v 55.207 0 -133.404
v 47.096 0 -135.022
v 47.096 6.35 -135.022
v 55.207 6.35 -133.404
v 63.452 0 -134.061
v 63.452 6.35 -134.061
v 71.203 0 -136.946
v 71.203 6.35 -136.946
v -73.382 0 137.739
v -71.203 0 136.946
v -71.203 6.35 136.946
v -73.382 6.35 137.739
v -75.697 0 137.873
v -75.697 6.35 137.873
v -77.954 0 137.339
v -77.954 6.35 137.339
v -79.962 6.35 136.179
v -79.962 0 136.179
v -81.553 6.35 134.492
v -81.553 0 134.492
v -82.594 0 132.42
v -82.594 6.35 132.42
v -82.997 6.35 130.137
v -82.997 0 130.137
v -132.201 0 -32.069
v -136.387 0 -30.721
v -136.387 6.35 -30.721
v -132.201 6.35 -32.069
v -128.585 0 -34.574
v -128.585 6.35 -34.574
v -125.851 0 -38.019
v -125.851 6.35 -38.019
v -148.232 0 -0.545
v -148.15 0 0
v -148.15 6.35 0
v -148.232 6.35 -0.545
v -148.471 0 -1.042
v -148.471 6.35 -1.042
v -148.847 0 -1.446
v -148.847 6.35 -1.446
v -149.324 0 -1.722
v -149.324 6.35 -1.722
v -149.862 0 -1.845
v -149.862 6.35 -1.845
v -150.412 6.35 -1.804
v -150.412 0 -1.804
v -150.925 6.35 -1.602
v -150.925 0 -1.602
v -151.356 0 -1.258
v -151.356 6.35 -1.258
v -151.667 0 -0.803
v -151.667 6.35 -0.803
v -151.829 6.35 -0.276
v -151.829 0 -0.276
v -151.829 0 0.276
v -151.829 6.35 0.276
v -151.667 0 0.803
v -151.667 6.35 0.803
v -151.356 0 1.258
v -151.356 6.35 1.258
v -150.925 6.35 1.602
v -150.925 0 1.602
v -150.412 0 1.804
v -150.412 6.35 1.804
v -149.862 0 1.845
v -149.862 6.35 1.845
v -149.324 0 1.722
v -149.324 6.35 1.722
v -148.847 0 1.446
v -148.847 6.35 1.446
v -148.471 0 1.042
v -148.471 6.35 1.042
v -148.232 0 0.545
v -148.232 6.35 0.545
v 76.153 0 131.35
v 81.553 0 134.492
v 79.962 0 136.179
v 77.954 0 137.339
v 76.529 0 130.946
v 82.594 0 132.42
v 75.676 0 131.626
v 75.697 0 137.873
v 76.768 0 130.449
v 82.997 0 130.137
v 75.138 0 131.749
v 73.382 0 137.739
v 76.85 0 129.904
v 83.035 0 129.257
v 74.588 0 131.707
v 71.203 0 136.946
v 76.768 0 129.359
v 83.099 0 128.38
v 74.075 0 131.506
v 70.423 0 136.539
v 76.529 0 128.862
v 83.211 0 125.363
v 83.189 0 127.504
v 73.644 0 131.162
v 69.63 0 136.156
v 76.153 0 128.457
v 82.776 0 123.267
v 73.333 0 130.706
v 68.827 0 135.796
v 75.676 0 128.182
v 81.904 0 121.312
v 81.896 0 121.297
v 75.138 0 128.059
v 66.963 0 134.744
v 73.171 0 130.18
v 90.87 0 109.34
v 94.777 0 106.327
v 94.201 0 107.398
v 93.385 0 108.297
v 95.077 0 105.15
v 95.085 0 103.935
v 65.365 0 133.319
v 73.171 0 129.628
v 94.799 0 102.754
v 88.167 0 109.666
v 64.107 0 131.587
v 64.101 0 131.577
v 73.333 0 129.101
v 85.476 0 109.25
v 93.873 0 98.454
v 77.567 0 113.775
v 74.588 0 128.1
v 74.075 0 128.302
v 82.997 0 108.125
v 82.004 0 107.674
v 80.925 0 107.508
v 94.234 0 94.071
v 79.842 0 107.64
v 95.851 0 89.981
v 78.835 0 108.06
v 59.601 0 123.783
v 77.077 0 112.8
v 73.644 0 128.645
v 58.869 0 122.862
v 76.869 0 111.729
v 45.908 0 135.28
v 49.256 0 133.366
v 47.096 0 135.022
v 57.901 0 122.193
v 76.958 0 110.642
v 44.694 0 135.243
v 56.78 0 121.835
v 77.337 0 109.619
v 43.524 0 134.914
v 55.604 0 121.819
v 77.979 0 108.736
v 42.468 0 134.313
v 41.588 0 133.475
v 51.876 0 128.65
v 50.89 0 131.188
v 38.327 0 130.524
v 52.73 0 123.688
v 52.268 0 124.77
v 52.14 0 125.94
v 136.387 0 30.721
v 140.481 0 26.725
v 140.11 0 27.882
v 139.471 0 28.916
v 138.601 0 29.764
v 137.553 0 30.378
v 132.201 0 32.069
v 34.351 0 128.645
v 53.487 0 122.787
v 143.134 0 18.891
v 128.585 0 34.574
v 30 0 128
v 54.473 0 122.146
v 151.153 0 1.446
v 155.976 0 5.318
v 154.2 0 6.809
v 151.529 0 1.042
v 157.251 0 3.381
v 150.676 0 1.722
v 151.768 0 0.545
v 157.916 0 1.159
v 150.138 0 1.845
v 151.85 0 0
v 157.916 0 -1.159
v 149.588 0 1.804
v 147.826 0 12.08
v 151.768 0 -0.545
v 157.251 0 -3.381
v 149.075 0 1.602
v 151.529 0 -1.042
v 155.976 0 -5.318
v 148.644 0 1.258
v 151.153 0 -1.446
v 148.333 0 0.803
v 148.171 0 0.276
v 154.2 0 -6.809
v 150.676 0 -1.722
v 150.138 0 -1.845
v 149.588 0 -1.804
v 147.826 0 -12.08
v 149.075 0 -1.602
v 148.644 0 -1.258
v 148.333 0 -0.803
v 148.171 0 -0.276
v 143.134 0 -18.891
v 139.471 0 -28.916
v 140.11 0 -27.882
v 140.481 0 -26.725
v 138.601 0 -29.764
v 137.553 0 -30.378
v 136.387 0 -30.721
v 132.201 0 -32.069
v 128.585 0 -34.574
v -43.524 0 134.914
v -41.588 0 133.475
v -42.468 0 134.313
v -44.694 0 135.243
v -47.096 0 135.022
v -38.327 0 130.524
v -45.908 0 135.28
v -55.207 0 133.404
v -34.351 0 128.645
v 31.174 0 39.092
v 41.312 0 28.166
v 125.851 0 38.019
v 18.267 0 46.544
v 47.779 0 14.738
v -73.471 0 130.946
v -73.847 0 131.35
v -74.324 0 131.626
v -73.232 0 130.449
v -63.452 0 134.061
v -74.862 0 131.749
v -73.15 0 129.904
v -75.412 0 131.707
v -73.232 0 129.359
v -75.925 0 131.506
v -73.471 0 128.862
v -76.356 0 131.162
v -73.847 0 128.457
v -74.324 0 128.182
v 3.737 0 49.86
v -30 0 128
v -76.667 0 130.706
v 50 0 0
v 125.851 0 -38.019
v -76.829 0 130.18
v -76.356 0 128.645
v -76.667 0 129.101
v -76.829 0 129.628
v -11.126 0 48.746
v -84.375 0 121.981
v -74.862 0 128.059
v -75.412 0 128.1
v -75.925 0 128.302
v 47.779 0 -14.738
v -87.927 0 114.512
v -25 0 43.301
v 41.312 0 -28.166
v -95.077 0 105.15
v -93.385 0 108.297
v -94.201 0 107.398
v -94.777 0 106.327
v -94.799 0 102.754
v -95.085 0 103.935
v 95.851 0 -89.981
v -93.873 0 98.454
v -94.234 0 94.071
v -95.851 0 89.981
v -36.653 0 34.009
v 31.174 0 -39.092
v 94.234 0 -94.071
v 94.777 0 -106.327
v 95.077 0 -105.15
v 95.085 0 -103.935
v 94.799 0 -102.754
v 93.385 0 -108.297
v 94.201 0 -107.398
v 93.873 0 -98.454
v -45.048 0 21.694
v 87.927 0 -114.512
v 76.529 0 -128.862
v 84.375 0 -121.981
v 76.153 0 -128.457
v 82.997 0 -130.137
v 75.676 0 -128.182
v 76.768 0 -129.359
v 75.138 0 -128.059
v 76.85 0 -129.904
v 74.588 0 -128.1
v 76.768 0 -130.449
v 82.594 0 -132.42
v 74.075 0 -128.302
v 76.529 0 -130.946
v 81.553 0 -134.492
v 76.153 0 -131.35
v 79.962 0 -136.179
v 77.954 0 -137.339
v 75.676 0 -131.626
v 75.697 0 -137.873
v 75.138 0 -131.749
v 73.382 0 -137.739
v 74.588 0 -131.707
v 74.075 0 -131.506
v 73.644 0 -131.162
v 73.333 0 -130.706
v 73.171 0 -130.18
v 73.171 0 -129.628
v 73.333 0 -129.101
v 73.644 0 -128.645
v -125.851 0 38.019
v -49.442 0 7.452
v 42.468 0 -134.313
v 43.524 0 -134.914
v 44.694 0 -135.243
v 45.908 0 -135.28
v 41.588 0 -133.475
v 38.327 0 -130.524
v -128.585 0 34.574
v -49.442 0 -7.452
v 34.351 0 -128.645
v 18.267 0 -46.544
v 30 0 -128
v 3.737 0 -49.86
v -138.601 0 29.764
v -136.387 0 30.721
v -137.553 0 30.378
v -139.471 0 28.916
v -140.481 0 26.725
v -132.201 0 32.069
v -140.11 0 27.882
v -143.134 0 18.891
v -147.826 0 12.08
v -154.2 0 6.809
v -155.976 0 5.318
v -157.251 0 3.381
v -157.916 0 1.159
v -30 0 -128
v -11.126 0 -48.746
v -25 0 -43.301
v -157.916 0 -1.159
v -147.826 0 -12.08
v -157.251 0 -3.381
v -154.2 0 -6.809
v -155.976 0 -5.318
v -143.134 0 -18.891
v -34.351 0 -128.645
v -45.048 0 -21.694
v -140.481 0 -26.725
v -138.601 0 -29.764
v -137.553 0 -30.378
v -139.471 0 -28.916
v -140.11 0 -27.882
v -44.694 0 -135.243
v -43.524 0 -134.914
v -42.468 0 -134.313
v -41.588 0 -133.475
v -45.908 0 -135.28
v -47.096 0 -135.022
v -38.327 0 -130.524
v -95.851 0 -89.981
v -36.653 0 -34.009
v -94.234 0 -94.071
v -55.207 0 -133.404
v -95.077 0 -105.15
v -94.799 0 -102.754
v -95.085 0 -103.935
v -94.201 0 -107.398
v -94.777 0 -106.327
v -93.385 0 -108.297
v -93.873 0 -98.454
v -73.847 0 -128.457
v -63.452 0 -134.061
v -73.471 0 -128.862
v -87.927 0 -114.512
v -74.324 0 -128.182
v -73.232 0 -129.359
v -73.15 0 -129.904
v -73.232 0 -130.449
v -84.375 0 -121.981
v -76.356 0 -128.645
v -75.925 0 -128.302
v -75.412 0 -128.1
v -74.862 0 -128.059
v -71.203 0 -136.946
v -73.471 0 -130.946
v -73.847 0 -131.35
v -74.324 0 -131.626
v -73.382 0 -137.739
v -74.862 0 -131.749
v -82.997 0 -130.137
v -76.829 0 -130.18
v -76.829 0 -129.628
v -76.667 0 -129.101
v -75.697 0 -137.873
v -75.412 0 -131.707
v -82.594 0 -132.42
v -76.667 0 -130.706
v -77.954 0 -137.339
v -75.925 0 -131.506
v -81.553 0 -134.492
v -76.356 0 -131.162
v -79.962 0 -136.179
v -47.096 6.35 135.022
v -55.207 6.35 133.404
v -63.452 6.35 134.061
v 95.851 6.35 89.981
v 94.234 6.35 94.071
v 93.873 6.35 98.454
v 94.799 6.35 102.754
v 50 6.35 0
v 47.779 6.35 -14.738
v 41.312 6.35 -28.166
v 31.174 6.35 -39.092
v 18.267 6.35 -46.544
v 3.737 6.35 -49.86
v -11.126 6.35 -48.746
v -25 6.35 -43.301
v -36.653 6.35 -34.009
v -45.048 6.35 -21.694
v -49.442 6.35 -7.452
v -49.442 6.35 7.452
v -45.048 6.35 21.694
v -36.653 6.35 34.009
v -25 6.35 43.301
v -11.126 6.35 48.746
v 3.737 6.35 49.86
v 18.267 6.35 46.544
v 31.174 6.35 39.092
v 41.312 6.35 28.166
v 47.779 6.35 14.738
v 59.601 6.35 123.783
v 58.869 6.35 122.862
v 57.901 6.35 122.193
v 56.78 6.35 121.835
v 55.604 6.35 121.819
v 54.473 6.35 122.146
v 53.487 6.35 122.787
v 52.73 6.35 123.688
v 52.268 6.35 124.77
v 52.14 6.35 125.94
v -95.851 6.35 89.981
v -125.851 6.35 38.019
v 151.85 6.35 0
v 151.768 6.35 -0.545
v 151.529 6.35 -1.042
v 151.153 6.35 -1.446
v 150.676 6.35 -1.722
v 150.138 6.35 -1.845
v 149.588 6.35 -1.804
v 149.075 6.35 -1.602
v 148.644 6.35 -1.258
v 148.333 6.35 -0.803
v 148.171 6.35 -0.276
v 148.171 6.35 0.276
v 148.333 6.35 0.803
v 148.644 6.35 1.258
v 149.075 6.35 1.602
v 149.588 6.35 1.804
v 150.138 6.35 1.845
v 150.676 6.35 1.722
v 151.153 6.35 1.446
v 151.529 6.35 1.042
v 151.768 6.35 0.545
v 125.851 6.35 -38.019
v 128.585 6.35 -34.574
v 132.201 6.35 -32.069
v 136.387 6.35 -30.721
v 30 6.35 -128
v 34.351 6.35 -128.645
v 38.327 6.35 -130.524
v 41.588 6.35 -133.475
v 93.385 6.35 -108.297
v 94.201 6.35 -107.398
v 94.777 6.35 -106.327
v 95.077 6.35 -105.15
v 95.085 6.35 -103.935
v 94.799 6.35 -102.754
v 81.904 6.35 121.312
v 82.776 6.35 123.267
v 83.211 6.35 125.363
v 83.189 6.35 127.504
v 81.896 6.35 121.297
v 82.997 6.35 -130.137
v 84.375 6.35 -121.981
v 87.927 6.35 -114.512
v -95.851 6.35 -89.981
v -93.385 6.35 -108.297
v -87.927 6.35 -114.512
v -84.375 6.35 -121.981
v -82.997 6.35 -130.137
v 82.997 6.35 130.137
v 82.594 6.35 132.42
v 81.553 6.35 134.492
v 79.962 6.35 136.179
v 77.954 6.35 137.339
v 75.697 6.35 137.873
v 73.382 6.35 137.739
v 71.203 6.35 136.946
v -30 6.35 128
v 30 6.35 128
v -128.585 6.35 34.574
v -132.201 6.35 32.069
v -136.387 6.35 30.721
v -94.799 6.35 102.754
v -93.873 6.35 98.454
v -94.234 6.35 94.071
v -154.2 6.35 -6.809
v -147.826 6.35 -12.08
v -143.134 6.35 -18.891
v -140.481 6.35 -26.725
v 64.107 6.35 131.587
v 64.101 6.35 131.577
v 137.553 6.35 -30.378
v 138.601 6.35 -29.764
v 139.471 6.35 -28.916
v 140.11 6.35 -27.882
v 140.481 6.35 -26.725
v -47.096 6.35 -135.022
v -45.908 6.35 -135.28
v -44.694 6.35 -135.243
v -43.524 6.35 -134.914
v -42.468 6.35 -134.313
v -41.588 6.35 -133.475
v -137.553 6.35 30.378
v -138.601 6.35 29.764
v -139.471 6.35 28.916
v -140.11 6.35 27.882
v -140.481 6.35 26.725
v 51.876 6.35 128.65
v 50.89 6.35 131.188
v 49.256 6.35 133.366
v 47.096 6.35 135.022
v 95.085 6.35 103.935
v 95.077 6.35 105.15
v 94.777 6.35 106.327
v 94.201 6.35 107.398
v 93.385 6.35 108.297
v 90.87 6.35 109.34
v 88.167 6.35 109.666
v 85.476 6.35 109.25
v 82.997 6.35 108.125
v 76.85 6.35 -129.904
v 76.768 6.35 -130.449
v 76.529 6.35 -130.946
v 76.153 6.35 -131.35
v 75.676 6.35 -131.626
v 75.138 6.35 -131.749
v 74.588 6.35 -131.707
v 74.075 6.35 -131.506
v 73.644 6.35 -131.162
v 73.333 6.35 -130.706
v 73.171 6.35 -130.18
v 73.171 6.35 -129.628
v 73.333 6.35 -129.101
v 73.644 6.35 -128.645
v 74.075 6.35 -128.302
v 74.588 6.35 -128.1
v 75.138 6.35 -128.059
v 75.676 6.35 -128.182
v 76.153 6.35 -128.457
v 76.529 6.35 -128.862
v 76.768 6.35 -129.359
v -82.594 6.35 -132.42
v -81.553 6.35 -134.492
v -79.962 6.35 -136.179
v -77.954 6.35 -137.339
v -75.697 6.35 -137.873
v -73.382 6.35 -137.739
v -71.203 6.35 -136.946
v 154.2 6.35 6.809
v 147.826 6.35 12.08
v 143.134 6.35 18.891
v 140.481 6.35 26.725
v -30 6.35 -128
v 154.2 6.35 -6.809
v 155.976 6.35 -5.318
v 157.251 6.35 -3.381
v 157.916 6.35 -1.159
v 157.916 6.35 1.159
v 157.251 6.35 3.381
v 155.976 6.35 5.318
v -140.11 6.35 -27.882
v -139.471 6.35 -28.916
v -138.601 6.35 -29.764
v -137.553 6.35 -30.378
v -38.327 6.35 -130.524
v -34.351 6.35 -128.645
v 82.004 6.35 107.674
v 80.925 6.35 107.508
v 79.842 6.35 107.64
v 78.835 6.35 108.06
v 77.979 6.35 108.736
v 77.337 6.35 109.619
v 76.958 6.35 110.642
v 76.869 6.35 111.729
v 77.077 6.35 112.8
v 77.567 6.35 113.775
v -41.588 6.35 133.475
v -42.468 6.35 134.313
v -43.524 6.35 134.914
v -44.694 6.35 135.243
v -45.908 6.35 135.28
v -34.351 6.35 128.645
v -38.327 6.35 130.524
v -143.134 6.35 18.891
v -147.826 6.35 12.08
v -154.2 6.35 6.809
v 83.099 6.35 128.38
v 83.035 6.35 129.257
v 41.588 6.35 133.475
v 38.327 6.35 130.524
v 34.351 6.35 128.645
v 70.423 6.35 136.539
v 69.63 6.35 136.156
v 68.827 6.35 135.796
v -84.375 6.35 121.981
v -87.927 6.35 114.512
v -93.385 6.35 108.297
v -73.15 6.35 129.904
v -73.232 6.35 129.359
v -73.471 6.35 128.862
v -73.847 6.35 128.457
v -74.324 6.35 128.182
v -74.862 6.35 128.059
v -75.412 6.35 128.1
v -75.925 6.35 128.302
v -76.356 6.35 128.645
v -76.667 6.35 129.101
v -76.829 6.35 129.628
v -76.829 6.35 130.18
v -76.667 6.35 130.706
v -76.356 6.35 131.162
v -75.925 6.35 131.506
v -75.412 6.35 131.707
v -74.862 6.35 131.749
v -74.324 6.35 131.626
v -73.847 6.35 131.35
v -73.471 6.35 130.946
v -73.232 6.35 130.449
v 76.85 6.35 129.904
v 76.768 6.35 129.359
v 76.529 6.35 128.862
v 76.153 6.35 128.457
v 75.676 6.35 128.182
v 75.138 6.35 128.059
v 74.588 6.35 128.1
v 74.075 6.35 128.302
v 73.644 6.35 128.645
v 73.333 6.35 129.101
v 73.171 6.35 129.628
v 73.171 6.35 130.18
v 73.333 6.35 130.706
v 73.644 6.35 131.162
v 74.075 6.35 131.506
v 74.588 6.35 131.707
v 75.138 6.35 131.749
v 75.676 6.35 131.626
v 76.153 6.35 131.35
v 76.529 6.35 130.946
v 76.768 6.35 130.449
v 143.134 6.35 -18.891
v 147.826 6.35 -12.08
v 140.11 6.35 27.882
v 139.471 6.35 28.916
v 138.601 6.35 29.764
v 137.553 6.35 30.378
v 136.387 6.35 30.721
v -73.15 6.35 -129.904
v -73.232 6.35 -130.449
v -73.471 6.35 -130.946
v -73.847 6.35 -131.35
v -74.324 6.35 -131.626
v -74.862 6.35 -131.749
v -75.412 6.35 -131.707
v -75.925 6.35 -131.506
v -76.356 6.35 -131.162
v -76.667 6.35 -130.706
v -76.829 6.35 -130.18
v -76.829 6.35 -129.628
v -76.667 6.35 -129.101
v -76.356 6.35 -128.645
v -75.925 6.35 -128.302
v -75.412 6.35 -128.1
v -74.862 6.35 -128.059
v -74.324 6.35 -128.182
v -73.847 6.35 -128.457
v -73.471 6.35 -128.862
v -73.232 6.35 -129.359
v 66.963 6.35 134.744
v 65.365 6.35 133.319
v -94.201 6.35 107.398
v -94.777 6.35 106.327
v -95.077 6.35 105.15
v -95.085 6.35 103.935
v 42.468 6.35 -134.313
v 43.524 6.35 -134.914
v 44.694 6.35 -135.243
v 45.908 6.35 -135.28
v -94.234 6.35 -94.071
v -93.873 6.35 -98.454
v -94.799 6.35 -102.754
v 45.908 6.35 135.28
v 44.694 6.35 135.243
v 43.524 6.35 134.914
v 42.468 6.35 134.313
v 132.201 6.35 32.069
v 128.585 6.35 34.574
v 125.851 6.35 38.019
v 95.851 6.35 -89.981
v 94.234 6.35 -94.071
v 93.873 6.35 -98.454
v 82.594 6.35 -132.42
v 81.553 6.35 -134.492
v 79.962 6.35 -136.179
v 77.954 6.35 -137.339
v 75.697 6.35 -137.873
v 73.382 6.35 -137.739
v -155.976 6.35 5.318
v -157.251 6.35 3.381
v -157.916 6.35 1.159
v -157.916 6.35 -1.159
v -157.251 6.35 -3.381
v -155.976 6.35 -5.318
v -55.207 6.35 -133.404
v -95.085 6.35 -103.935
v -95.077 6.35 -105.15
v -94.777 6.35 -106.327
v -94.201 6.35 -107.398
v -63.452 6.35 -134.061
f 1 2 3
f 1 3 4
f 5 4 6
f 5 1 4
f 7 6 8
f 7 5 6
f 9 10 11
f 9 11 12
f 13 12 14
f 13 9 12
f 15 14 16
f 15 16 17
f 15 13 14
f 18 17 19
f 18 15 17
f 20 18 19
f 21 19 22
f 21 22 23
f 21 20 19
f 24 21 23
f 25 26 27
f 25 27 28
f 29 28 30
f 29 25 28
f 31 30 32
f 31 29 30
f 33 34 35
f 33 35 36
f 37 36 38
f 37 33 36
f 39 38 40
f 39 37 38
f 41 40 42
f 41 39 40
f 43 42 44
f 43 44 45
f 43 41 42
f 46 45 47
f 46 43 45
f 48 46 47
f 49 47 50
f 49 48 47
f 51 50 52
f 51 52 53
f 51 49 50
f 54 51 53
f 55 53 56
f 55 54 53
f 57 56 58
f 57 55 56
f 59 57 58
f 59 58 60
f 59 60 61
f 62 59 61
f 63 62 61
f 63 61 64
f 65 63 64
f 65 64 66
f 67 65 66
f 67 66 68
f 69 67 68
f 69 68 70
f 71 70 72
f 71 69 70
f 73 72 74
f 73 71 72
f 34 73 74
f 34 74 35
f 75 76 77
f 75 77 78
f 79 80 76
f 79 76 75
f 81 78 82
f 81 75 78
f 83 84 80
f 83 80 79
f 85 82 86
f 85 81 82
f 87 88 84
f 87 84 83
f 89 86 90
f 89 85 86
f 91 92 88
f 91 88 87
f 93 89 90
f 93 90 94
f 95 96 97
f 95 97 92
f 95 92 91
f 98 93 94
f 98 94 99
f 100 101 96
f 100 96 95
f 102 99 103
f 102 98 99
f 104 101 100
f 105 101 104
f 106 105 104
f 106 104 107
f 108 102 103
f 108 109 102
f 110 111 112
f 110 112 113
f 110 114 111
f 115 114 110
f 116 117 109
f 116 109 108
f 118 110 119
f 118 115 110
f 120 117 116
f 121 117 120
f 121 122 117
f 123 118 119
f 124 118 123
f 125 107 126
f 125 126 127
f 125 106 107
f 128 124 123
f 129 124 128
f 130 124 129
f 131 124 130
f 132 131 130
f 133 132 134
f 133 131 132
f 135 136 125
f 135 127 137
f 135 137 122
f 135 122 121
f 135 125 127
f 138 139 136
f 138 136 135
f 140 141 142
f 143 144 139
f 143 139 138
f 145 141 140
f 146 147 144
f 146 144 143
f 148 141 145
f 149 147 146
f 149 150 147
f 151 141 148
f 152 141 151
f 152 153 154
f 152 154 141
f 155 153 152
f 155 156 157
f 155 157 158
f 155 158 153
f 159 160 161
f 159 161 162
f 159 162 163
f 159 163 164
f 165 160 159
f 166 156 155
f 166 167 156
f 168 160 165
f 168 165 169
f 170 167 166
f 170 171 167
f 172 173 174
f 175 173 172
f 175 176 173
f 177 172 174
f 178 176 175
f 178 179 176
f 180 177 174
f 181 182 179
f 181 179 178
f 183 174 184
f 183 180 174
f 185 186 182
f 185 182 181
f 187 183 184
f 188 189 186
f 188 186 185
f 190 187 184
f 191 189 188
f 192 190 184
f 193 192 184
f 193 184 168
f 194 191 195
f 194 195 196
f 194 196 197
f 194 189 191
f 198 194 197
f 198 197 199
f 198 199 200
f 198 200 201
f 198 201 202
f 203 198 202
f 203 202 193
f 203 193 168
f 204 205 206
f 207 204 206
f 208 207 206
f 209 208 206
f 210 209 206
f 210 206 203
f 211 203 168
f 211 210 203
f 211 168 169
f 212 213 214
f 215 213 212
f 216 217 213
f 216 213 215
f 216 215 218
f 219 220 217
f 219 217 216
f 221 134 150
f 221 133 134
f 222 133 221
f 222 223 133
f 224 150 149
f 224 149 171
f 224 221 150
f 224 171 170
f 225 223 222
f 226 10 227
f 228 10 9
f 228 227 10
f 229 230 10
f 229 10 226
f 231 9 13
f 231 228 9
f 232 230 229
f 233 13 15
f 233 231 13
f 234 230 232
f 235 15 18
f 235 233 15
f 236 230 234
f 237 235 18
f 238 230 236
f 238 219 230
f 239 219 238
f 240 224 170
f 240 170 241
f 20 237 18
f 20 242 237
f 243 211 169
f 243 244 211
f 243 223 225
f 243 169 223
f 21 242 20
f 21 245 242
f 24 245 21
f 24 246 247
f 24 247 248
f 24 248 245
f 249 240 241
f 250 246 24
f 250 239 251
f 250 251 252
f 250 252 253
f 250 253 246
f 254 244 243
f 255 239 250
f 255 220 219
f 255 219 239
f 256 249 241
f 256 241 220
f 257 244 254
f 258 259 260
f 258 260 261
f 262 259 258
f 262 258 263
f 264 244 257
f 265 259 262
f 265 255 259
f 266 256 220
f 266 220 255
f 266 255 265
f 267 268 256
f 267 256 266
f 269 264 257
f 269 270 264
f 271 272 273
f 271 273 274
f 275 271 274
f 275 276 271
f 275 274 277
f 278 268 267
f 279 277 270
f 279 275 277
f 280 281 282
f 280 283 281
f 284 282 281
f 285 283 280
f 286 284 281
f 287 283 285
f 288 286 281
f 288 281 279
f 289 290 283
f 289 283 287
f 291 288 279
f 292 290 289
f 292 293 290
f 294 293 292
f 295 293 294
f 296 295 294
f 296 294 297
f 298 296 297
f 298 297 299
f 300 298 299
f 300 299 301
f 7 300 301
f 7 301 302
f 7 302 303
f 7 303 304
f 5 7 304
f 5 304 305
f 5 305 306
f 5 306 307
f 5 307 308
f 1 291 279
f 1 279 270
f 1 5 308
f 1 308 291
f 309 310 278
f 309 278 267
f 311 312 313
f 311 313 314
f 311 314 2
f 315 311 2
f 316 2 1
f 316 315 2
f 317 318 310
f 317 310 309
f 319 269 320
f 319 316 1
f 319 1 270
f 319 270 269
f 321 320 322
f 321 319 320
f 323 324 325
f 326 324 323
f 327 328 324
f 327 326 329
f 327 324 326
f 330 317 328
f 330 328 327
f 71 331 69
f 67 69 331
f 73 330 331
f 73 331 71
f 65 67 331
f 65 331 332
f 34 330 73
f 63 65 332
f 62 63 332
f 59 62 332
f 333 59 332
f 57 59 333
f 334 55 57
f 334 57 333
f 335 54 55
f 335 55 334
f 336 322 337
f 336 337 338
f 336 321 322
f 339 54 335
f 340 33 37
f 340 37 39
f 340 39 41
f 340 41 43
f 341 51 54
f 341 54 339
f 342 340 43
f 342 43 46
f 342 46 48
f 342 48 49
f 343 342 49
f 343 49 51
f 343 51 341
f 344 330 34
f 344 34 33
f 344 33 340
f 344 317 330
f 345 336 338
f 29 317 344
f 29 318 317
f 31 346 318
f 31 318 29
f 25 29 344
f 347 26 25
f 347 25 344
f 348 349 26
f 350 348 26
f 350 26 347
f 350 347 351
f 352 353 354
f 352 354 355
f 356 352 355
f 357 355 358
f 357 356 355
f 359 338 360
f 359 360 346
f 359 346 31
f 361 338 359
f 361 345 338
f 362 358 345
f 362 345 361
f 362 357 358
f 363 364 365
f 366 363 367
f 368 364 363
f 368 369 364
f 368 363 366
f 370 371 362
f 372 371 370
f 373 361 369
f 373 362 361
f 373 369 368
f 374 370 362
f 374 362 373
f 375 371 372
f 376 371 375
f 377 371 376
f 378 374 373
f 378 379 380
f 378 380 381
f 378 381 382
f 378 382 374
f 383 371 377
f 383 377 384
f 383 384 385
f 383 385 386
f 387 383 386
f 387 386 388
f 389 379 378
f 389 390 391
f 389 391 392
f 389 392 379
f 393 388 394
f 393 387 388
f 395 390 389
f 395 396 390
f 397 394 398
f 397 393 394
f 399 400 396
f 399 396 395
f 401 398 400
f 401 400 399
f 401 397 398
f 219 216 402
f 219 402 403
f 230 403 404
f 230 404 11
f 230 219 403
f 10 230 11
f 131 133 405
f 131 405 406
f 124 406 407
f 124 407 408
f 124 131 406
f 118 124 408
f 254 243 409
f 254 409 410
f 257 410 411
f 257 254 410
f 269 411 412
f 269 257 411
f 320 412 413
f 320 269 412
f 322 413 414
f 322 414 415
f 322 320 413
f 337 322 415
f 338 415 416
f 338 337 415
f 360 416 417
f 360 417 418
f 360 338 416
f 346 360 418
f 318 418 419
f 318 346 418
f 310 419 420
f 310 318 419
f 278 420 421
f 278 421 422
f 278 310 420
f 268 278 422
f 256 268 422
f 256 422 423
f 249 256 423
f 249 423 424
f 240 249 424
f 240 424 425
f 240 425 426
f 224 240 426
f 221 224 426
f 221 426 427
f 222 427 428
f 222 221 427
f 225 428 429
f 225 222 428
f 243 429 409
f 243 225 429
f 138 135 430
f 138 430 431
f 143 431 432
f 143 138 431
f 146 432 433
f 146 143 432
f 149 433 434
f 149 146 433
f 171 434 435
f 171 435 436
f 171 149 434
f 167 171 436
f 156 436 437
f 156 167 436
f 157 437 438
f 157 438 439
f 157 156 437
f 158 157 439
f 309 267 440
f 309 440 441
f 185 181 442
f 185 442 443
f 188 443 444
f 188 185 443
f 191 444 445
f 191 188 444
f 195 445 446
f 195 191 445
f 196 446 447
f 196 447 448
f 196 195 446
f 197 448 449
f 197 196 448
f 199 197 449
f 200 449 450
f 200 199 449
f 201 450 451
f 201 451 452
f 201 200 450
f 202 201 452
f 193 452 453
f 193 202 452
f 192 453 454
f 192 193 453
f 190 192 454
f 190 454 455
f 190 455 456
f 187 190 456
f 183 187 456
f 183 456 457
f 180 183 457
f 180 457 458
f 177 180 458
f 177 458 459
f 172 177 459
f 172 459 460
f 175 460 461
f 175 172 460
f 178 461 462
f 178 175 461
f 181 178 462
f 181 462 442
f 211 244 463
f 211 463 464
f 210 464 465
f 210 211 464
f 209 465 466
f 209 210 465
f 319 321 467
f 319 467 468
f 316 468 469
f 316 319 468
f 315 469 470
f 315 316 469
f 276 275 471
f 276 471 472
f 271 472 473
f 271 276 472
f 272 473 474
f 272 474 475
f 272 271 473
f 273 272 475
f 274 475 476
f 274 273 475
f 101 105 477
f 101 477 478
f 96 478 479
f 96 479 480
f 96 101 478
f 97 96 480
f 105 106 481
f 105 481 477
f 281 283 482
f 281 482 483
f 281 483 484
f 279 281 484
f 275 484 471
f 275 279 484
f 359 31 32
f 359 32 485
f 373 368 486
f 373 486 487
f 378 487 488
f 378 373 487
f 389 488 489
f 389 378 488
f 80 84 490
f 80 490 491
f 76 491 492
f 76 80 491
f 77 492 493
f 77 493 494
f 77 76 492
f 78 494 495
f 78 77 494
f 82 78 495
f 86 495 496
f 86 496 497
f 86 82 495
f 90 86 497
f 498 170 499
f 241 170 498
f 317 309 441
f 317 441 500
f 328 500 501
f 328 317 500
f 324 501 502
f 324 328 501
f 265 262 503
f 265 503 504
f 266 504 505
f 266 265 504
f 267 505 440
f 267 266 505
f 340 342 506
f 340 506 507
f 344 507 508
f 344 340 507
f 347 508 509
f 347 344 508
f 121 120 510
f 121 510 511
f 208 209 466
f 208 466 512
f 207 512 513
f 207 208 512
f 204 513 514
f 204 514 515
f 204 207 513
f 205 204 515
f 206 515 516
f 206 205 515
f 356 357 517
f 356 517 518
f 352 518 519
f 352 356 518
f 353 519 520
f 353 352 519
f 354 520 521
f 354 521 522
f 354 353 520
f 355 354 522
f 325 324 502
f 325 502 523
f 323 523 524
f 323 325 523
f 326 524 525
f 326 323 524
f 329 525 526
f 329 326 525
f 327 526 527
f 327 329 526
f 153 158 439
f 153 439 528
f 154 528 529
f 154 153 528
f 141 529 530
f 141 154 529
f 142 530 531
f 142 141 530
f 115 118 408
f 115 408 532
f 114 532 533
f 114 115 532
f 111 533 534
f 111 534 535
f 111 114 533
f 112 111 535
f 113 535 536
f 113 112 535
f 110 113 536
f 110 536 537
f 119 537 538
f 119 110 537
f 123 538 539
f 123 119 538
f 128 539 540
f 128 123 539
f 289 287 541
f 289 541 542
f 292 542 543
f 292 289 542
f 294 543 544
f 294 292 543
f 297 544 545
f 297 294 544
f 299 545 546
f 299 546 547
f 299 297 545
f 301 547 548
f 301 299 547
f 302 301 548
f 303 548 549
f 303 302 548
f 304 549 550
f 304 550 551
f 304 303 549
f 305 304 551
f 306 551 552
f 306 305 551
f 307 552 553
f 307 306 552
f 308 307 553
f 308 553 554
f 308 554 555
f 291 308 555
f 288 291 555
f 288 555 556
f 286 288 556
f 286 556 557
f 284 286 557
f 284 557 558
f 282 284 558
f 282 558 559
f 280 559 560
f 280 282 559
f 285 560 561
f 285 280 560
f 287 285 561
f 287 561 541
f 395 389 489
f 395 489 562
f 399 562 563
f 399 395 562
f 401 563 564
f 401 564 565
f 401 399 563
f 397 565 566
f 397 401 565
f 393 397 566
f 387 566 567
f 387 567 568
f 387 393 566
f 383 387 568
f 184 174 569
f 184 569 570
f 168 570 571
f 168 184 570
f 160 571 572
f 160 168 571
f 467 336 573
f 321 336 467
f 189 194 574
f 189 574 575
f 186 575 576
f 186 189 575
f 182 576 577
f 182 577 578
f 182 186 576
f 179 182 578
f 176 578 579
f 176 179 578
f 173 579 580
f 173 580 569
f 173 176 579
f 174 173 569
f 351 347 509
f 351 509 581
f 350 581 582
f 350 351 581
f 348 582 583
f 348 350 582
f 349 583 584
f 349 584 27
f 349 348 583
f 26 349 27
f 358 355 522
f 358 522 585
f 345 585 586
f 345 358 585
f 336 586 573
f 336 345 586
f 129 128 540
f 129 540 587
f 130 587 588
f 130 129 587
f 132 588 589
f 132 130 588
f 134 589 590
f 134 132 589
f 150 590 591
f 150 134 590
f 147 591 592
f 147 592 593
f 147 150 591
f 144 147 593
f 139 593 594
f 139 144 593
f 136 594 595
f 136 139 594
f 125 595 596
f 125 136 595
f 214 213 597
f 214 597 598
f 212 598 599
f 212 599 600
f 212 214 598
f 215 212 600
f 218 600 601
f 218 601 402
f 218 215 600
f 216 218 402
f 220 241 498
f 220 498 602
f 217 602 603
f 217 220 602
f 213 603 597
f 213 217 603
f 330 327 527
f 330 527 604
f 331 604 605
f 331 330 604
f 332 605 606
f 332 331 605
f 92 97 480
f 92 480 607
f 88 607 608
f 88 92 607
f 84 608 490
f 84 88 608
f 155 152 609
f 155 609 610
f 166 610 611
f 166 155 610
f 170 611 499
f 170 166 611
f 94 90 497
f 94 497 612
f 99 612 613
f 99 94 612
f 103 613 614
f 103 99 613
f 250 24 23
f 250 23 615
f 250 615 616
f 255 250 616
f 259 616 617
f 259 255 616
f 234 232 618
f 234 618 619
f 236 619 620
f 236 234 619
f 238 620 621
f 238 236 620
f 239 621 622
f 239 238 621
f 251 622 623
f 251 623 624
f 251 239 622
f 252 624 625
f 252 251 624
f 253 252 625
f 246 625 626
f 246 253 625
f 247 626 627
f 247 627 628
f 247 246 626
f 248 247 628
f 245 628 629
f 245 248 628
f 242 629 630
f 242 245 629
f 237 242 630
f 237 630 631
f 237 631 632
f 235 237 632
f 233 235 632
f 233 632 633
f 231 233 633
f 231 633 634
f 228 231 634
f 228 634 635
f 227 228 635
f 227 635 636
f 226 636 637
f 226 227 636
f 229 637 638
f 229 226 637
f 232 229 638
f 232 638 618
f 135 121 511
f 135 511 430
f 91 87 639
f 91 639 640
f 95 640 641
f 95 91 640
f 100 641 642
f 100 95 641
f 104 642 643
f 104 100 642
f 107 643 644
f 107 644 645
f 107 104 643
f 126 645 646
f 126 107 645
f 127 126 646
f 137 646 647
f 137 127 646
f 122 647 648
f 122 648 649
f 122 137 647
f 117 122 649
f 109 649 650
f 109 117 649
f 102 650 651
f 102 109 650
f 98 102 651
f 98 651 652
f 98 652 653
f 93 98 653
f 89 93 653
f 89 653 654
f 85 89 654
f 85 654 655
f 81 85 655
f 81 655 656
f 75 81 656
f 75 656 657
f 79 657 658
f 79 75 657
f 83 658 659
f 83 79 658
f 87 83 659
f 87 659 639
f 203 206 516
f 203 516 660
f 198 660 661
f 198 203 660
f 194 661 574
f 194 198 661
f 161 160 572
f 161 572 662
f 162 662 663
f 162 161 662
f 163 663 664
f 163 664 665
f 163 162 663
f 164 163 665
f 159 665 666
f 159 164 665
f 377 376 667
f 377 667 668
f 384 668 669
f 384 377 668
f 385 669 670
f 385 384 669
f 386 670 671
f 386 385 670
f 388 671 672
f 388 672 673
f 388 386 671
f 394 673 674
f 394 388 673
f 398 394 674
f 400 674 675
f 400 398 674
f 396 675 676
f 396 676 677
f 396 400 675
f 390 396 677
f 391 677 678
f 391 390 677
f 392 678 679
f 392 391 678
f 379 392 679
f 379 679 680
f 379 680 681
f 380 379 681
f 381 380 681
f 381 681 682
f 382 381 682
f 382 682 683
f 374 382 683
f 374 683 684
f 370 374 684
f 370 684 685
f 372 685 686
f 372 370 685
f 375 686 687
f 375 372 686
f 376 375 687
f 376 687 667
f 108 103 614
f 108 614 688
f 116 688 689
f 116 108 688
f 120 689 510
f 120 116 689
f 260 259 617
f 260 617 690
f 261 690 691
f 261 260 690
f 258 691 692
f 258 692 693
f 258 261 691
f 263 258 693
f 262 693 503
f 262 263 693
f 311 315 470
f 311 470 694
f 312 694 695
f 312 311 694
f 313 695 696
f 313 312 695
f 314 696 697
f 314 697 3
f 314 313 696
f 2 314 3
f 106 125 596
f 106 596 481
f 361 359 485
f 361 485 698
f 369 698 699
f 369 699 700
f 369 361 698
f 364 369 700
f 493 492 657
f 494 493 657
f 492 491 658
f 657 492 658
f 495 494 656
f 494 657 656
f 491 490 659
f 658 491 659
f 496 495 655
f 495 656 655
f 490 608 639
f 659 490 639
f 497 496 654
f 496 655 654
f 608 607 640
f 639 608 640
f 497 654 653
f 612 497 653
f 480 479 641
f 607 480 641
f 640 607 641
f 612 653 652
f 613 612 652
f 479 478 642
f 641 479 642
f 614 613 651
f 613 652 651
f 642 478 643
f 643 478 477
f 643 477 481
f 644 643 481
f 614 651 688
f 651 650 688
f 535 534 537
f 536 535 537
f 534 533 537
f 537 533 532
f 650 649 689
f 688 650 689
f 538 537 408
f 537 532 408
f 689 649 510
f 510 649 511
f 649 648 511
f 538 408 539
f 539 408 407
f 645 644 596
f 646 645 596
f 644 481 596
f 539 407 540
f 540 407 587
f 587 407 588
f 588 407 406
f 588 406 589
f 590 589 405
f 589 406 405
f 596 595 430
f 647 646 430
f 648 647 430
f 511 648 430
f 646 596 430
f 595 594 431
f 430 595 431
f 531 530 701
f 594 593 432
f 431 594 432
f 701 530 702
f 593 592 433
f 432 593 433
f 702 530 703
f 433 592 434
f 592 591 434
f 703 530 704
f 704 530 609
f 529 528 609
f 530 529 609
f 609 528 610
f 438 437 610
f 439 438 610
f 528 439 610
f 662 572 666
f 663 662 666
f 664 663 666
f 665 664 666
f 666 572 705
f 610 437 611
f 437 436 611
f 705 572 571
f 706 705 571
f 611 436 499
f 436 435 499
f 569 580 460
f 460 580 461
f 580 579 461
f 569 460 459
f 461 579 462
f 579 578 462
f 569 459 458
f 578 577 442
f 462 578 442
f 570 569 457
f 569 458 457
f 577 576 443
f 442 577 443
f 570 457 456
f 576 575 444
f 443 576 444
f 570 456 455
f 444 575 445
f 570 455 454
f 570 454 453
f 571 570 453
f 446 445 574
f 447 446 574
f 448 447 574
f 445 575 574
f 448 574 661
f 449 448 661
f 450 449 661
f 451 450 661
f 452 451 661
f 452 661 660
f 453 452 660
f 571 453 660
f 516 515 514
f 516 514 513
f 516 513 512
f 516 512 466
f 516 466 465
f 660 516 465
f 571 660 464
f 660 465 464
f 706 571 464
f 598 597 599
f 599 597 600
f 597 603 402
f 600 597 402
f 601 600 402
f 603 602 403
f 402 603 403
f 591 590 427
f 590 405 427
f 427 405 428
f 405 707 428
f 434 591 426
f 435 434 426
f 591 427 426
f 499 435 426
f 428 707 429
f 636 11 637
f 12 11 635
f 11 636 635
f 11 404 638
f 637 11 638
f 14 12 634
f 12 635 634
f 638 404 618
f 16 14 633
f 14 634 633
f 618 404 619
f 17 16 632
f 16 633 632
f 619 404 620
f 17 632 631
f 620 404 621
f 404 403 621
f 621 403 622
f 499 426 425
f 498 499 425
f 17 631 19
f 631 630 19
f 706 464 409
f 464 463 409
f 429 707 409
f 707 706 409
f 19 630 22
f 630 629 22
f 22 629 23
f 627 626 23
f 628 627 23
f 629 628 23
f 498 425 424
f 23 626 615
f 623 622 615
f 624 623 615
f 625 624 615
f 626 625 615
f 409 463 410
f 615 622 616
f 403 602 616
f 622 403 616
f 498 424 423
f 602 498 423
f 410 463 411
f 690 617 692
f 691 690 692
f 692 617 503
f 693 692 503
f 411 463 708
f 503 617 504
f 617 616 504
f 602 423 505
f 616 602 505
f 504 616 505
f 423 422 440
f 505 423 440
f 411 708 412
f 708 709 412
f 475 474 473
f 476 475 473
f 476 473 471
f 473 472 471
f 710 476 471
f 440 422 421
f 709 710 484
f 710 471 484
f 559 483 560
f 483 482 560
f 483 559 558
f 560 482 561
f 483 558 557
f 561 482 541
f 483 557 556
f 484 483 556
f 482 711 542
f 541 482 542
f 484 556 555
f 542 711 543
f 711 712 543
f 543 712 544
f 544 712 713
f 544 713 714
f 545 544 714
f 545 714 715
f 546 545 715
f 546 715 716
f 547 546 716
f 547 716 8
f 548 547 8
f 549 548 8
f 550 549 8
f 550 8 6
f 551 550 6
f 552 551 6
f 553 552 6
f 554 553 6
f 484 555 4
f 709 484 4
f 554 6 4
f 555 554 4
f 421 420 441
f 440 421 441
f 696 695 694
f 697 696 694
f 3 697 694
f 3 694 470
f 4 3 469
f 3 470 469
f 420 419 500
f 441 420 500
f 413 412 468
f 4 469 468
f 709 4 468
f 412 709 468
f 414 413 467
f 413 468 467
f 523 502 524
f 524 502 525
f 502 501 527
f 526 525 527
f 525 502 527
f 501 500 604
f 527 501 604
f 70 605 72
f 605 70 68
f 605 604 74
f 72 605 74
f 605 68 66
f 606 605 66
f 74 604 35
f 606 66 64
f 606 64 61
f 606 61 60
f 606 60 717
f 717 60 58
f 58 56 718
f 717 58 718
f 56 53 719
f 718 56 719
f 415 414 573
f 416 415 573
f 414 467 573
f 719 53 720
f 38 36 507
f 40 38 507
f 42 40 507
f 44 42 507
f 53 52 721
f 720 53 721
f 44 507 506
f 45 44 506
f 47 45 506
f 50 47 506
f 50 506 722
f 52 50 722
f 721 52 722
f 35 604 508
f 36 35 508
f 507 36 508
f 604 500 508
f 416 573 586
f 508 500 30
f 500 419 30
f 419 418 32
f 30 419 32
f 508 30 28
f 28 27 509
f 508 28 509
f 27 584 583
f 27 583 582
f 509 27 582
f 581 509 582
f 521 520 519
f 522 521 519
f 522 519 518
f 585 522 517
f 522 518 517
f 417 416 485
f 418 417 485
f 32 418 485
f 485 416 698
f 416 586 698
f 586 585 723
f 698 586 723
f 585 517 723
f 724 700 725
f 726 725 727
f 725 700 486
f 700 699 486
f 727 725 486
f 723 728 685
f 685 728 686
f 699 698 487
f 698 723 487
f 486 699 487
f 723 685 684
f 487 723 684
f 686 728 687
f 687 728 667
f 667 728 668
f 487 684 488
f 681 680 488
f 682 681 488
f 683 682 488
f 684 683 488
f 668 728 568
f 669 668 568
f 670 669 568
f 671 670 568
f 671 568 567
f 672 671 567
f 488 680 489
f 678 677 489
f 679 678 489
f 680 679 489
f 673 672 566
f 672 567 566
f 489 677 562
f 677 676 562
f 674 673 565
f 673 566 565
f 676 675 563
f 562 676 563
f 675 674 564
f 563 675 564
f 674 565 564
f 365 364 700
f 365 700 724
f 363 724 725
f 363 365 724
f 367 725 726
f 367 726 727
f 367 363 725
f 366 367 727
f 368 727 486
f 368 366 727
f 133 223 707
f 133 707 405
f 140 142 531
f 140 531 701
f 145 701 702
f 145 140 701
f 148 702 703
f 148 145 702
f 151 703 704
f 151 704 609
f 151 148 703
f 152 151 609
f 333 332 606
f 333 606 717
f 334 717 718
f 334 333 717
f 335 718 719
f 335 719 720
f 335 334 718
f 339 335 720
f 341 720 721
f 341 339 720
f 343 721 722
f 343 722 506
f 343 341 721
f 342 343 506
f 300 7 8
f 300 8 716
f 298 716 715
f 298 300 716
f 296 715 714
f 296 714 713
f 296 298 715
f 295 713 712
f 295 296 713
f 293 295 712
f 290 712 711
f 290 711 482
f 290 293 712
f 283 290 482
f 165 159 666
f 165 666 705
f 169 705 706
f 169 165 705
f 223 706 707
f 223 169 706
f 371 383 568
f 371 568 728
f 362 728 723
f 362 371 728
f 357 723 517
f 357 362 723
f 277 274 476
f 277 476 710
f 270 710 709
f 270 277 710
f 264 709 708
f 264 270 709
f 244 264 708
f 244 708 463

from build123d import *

# Parameters (mm, degrees)
SKETCH1_R           = 1.85
SKETCH1_R_2         = 50
BOSS_EXTRUDE1_DEPTH = 6.35


with BuildPart() as part:
    # Sketch1 → Boss-Extrude1 (new body)
    with BuildSketch(Plane(origin=(0, 0, 0), x_dir=(1, 0, 0), z_dir=(0, 1, 0))):
        with BuildLine():
            Line((77.567379868, -113.774878941), (81.895896581, -121.29702529))
            Line((81.895896581, -121.29702529), (81.904324829, -121.31160095))
            ThreePointArc((81.904324829, -121.31160095), (83.049348254, -124.303633996), (83.189448927, -127.504213973))
            ThreePointArc((83.189448927, -127.504213973), (83.064062558, -128.818339264), (82.996609195, -130.136708357))
            ThreePointArc((82.996609195, -130.136708357), (79, -136.832013798), (71.203390805, -136.94552617))
            ThreePointArc((71.203390805, -136.94552617), (70.027922997, -136.344757949), (68.827163927, -135.796283084))
            ThreePointArc((68.827163927, -135.796283084), (66.125430696, -134.074662353), (64.106765781, -131.587026457))
            Line((64.106765781, -131.587026457), (64.101233791, -131.577414018))
            Line((64.101233791, -131.577414018), (59.601233791, -123.783185384))
            ThreePointArc((59.601233791, -123.783185384), (55.026304797, -121.940521916), (52.14020721, -125.939999968))
            ThreePointArc((52.14020721, -125.939999968), (50.889960833, -131.187577731), (47.09575677, -135.022183828))
            ThreePointArc((47.09575677, -135.022183828), (44.098818948, -135.114328678), (41.588023883, -133.475415889))
            ThreePointArc((41.588023883, -133.475415889), (36.408246185, -129.437759004), (30, -128))
            Line((30, -128), (-30, -128))
            ThreePointArc((-30, -128), (-36.408246185, -129.437759004), (-41.588023883, -133.475415889))
            ThreePointArc((-41.588023883, -133.475415889), (-44.098818948, -135.114328677), (-47.09575677, -135.022183828))
            ThreePointArc((-47.09575677, -135.022183828), (-59.351969188, -133.446982526), (-71.203390805, -136.94552617))
            ThreePointArc((-71.203390805, -136.94552617), (-79, -136.832013798), (-82.996609195, -130.136708357))
            ThreePointArc((-82.996609195, -130.136708357), (-85.892492332, -118.123804344), (-93.384762884, -108.297213687))
            ThreePointArc((-93.384762884, -108.297213687), (-94.963031576, -105.747861824), (-94.799088999, -102.753993121))
            ThreePointArc((-94.799088999, -102.753993121), (-93.892264414, -96.249345606), (-95.851251684, -89.980762113))
            Line((-95.851251684, -89.980762113), (-125.851251684, -38.019237886))
            ThreePointArc((-125.851251684, -38.019237886), (-130.300510599, -33.188413398), (-136.387112883, -30.721422769))
            ThreePointArc((-136.387112883, -30.721422769), (-139.061850524, -29.366466853), (-140.480519654, -26.724970141))
            ThreePointArc((-140.480519654, -26.724970141), (-145.24446152, -15.323178182), (-154.2, -6.808817812))
            ThreePointArc((-154.2, -6.808817812), (-158, 0), (-154.2, 6.808817812))
            ThreePointArc((-154.2, 6.808817812), (-145.24446152, 15.323178182), (-140.480519654, 26.72497014))
            ThreePointArc((-140.480519654, 26.72497014), (-139.061850524, 29.366466853), (-136.387112883, 30.721422769))
            ThreePointArc((-136.387112883, 30.721422769), (-130.300510599, 33.188413398), (-125.851251684, 38.019237887))
            Line((-125.851251684, 38.019237887), (-95.851251684, 89.980762114))
            ThreePointArc((-95.851251684, 89.980762114), (-93.892264414, 96.249345606), (-94.799088999, 102.753993121))
            ThreePointArc((-94.799088999, 102.753993121), (-94.963031576, 105.747861824), (-93.384762884, 108.297213687))
            ThreePointArc((-93.384762884, 108.297213687), (-85.892492332, 118.123804344), (-82.996609195, 130.136708357))
            ThreePointArc((-82.996609195, 130.136708357), (-79, 136.832013798), (-71.203390805, 136.94552617))
            ThreePointArc((-71.203390805, 136.94552617), (-59.351969188, 133.446982526), (-47.09575677, 135.022183827))
            ThreePointArc((-47.09575677, 135.022183827), (-44.098818948, 135.114328677), (-41.588023883, 133.475415889))
            ThreePointArc((-41.588023883, 133.475415889), (-36.408246185, 129.437759004), (-30, 128))
            Line((-30, 128), (30, 128))
            ThreePointArc((30, 128), (36.408246185, 129.437759004), (41.588023883, 133.475415889))
            ThreePointArc((41.588023883, 133.475415889), (44.098818948, 135.114328677), (47.09575677, 135.022183827))
            ThreePointArc((47.09575677, 135.022183827), (59.351969188, 133.446982526), (71.203390805, 136.94552617))
            ThreePointArc((71.203390805, 136.94552617), (79, 136.832013798), (82.996609195, 130.136708357))
            ThreePointArc((82.996609195, 130.136708357), (85.892492332, 118.123804344), (93.384762884, 108.297213687))
            ThreePointArc((93.384762884, 108.297213687), (94.963031576, 105.747861824), (94.799088999, 102.753993121))
            ThreePointArc((94.799088999, 102.753993121), (93.892264414, 96.249345606), (95.851251684, 89.980762113))
            Line((95.851251684, 89.980762113), (125.851251684, 38.019237886))
            ThreePointArc((125.851251684, 38.019237886), (130.300510599, 33.188413398), (136.387112882, 30.721422769))
            ThreePointArc((136.387112882, 30.721422769), (139.061850524, 29.366466853), (140.480519654, 26.72497014))
            ThreePointArc((140.480519654, 26.72497014), (145.24446152, 15.323178182), (154.2, 6.808817812))
            ThreePointArc((154.2, 6.808817812), (158, 0), (154.2, -6.808817812))
            ThreePointArc((154.2, -6.808817812), (145.24446152, -15.323178182), (140.480519654, -26.72497014))
            ThreePointArc((140.480519654, -26.72497014), (139.061850524, -29.366466853), (136.387112882, -30.721422769))
            ThreePointArc((136.387112882, -30.721422769), (130.300510599, -33.188413399), (125.851251684, -38.019237887))
            Line((125.851251684, -38.019237887), (95.851251684, -89.980762114))
            ThreePointArc((95.851251684, -89.980762114), (93.892264414, -96.249345606), (94.799088999, -102.753993121))
            ThreePointArc((94.799088999, -102.753993121), (94.963031576, -105.747861824), (93.384762884, -108.297213687))
            ThreePointArc((93.384762884, -108.297213687), (88.166794559, -109.665787745), (82.997135719, -108.124743986))
            ThreePointArc((82.997135719, -108.124743986), (77.978753703, -108.736153752), (77.567379868, -113.774878941))
        make_face()
        with Locations((-75, -129.903810568)):
            Circle(SKETCH1_R, mode=Mode.SUBTRACT)
        with Locations((75, -129.903810568)):
            Circle(SKETCH1_R, mode=Mode.SUBTRACT)
        with Locations((150, 0)):
            Circle(SKETCH1_R, mode=Mode.SUBTRACT)
        with Locations((75, 129.903810568)):
            Circle(SKETCH1_R, mode=Mode.SUBTRACT)
        with Locations((-75, 129.903810568)):
            Circle(SKETCH1_R, mode=Mode.SUBTRACT)
        with Locations((-150, 0)):
            Circle(SKETCH1_R, mode=Mode.SUBTRACT)
        Circle(SKETCH1_R_2, mode=Mode.SUBTRACT)
    extrude(amount=BOSS_EXTRUDE1_DEPTH)


solid = part.part
